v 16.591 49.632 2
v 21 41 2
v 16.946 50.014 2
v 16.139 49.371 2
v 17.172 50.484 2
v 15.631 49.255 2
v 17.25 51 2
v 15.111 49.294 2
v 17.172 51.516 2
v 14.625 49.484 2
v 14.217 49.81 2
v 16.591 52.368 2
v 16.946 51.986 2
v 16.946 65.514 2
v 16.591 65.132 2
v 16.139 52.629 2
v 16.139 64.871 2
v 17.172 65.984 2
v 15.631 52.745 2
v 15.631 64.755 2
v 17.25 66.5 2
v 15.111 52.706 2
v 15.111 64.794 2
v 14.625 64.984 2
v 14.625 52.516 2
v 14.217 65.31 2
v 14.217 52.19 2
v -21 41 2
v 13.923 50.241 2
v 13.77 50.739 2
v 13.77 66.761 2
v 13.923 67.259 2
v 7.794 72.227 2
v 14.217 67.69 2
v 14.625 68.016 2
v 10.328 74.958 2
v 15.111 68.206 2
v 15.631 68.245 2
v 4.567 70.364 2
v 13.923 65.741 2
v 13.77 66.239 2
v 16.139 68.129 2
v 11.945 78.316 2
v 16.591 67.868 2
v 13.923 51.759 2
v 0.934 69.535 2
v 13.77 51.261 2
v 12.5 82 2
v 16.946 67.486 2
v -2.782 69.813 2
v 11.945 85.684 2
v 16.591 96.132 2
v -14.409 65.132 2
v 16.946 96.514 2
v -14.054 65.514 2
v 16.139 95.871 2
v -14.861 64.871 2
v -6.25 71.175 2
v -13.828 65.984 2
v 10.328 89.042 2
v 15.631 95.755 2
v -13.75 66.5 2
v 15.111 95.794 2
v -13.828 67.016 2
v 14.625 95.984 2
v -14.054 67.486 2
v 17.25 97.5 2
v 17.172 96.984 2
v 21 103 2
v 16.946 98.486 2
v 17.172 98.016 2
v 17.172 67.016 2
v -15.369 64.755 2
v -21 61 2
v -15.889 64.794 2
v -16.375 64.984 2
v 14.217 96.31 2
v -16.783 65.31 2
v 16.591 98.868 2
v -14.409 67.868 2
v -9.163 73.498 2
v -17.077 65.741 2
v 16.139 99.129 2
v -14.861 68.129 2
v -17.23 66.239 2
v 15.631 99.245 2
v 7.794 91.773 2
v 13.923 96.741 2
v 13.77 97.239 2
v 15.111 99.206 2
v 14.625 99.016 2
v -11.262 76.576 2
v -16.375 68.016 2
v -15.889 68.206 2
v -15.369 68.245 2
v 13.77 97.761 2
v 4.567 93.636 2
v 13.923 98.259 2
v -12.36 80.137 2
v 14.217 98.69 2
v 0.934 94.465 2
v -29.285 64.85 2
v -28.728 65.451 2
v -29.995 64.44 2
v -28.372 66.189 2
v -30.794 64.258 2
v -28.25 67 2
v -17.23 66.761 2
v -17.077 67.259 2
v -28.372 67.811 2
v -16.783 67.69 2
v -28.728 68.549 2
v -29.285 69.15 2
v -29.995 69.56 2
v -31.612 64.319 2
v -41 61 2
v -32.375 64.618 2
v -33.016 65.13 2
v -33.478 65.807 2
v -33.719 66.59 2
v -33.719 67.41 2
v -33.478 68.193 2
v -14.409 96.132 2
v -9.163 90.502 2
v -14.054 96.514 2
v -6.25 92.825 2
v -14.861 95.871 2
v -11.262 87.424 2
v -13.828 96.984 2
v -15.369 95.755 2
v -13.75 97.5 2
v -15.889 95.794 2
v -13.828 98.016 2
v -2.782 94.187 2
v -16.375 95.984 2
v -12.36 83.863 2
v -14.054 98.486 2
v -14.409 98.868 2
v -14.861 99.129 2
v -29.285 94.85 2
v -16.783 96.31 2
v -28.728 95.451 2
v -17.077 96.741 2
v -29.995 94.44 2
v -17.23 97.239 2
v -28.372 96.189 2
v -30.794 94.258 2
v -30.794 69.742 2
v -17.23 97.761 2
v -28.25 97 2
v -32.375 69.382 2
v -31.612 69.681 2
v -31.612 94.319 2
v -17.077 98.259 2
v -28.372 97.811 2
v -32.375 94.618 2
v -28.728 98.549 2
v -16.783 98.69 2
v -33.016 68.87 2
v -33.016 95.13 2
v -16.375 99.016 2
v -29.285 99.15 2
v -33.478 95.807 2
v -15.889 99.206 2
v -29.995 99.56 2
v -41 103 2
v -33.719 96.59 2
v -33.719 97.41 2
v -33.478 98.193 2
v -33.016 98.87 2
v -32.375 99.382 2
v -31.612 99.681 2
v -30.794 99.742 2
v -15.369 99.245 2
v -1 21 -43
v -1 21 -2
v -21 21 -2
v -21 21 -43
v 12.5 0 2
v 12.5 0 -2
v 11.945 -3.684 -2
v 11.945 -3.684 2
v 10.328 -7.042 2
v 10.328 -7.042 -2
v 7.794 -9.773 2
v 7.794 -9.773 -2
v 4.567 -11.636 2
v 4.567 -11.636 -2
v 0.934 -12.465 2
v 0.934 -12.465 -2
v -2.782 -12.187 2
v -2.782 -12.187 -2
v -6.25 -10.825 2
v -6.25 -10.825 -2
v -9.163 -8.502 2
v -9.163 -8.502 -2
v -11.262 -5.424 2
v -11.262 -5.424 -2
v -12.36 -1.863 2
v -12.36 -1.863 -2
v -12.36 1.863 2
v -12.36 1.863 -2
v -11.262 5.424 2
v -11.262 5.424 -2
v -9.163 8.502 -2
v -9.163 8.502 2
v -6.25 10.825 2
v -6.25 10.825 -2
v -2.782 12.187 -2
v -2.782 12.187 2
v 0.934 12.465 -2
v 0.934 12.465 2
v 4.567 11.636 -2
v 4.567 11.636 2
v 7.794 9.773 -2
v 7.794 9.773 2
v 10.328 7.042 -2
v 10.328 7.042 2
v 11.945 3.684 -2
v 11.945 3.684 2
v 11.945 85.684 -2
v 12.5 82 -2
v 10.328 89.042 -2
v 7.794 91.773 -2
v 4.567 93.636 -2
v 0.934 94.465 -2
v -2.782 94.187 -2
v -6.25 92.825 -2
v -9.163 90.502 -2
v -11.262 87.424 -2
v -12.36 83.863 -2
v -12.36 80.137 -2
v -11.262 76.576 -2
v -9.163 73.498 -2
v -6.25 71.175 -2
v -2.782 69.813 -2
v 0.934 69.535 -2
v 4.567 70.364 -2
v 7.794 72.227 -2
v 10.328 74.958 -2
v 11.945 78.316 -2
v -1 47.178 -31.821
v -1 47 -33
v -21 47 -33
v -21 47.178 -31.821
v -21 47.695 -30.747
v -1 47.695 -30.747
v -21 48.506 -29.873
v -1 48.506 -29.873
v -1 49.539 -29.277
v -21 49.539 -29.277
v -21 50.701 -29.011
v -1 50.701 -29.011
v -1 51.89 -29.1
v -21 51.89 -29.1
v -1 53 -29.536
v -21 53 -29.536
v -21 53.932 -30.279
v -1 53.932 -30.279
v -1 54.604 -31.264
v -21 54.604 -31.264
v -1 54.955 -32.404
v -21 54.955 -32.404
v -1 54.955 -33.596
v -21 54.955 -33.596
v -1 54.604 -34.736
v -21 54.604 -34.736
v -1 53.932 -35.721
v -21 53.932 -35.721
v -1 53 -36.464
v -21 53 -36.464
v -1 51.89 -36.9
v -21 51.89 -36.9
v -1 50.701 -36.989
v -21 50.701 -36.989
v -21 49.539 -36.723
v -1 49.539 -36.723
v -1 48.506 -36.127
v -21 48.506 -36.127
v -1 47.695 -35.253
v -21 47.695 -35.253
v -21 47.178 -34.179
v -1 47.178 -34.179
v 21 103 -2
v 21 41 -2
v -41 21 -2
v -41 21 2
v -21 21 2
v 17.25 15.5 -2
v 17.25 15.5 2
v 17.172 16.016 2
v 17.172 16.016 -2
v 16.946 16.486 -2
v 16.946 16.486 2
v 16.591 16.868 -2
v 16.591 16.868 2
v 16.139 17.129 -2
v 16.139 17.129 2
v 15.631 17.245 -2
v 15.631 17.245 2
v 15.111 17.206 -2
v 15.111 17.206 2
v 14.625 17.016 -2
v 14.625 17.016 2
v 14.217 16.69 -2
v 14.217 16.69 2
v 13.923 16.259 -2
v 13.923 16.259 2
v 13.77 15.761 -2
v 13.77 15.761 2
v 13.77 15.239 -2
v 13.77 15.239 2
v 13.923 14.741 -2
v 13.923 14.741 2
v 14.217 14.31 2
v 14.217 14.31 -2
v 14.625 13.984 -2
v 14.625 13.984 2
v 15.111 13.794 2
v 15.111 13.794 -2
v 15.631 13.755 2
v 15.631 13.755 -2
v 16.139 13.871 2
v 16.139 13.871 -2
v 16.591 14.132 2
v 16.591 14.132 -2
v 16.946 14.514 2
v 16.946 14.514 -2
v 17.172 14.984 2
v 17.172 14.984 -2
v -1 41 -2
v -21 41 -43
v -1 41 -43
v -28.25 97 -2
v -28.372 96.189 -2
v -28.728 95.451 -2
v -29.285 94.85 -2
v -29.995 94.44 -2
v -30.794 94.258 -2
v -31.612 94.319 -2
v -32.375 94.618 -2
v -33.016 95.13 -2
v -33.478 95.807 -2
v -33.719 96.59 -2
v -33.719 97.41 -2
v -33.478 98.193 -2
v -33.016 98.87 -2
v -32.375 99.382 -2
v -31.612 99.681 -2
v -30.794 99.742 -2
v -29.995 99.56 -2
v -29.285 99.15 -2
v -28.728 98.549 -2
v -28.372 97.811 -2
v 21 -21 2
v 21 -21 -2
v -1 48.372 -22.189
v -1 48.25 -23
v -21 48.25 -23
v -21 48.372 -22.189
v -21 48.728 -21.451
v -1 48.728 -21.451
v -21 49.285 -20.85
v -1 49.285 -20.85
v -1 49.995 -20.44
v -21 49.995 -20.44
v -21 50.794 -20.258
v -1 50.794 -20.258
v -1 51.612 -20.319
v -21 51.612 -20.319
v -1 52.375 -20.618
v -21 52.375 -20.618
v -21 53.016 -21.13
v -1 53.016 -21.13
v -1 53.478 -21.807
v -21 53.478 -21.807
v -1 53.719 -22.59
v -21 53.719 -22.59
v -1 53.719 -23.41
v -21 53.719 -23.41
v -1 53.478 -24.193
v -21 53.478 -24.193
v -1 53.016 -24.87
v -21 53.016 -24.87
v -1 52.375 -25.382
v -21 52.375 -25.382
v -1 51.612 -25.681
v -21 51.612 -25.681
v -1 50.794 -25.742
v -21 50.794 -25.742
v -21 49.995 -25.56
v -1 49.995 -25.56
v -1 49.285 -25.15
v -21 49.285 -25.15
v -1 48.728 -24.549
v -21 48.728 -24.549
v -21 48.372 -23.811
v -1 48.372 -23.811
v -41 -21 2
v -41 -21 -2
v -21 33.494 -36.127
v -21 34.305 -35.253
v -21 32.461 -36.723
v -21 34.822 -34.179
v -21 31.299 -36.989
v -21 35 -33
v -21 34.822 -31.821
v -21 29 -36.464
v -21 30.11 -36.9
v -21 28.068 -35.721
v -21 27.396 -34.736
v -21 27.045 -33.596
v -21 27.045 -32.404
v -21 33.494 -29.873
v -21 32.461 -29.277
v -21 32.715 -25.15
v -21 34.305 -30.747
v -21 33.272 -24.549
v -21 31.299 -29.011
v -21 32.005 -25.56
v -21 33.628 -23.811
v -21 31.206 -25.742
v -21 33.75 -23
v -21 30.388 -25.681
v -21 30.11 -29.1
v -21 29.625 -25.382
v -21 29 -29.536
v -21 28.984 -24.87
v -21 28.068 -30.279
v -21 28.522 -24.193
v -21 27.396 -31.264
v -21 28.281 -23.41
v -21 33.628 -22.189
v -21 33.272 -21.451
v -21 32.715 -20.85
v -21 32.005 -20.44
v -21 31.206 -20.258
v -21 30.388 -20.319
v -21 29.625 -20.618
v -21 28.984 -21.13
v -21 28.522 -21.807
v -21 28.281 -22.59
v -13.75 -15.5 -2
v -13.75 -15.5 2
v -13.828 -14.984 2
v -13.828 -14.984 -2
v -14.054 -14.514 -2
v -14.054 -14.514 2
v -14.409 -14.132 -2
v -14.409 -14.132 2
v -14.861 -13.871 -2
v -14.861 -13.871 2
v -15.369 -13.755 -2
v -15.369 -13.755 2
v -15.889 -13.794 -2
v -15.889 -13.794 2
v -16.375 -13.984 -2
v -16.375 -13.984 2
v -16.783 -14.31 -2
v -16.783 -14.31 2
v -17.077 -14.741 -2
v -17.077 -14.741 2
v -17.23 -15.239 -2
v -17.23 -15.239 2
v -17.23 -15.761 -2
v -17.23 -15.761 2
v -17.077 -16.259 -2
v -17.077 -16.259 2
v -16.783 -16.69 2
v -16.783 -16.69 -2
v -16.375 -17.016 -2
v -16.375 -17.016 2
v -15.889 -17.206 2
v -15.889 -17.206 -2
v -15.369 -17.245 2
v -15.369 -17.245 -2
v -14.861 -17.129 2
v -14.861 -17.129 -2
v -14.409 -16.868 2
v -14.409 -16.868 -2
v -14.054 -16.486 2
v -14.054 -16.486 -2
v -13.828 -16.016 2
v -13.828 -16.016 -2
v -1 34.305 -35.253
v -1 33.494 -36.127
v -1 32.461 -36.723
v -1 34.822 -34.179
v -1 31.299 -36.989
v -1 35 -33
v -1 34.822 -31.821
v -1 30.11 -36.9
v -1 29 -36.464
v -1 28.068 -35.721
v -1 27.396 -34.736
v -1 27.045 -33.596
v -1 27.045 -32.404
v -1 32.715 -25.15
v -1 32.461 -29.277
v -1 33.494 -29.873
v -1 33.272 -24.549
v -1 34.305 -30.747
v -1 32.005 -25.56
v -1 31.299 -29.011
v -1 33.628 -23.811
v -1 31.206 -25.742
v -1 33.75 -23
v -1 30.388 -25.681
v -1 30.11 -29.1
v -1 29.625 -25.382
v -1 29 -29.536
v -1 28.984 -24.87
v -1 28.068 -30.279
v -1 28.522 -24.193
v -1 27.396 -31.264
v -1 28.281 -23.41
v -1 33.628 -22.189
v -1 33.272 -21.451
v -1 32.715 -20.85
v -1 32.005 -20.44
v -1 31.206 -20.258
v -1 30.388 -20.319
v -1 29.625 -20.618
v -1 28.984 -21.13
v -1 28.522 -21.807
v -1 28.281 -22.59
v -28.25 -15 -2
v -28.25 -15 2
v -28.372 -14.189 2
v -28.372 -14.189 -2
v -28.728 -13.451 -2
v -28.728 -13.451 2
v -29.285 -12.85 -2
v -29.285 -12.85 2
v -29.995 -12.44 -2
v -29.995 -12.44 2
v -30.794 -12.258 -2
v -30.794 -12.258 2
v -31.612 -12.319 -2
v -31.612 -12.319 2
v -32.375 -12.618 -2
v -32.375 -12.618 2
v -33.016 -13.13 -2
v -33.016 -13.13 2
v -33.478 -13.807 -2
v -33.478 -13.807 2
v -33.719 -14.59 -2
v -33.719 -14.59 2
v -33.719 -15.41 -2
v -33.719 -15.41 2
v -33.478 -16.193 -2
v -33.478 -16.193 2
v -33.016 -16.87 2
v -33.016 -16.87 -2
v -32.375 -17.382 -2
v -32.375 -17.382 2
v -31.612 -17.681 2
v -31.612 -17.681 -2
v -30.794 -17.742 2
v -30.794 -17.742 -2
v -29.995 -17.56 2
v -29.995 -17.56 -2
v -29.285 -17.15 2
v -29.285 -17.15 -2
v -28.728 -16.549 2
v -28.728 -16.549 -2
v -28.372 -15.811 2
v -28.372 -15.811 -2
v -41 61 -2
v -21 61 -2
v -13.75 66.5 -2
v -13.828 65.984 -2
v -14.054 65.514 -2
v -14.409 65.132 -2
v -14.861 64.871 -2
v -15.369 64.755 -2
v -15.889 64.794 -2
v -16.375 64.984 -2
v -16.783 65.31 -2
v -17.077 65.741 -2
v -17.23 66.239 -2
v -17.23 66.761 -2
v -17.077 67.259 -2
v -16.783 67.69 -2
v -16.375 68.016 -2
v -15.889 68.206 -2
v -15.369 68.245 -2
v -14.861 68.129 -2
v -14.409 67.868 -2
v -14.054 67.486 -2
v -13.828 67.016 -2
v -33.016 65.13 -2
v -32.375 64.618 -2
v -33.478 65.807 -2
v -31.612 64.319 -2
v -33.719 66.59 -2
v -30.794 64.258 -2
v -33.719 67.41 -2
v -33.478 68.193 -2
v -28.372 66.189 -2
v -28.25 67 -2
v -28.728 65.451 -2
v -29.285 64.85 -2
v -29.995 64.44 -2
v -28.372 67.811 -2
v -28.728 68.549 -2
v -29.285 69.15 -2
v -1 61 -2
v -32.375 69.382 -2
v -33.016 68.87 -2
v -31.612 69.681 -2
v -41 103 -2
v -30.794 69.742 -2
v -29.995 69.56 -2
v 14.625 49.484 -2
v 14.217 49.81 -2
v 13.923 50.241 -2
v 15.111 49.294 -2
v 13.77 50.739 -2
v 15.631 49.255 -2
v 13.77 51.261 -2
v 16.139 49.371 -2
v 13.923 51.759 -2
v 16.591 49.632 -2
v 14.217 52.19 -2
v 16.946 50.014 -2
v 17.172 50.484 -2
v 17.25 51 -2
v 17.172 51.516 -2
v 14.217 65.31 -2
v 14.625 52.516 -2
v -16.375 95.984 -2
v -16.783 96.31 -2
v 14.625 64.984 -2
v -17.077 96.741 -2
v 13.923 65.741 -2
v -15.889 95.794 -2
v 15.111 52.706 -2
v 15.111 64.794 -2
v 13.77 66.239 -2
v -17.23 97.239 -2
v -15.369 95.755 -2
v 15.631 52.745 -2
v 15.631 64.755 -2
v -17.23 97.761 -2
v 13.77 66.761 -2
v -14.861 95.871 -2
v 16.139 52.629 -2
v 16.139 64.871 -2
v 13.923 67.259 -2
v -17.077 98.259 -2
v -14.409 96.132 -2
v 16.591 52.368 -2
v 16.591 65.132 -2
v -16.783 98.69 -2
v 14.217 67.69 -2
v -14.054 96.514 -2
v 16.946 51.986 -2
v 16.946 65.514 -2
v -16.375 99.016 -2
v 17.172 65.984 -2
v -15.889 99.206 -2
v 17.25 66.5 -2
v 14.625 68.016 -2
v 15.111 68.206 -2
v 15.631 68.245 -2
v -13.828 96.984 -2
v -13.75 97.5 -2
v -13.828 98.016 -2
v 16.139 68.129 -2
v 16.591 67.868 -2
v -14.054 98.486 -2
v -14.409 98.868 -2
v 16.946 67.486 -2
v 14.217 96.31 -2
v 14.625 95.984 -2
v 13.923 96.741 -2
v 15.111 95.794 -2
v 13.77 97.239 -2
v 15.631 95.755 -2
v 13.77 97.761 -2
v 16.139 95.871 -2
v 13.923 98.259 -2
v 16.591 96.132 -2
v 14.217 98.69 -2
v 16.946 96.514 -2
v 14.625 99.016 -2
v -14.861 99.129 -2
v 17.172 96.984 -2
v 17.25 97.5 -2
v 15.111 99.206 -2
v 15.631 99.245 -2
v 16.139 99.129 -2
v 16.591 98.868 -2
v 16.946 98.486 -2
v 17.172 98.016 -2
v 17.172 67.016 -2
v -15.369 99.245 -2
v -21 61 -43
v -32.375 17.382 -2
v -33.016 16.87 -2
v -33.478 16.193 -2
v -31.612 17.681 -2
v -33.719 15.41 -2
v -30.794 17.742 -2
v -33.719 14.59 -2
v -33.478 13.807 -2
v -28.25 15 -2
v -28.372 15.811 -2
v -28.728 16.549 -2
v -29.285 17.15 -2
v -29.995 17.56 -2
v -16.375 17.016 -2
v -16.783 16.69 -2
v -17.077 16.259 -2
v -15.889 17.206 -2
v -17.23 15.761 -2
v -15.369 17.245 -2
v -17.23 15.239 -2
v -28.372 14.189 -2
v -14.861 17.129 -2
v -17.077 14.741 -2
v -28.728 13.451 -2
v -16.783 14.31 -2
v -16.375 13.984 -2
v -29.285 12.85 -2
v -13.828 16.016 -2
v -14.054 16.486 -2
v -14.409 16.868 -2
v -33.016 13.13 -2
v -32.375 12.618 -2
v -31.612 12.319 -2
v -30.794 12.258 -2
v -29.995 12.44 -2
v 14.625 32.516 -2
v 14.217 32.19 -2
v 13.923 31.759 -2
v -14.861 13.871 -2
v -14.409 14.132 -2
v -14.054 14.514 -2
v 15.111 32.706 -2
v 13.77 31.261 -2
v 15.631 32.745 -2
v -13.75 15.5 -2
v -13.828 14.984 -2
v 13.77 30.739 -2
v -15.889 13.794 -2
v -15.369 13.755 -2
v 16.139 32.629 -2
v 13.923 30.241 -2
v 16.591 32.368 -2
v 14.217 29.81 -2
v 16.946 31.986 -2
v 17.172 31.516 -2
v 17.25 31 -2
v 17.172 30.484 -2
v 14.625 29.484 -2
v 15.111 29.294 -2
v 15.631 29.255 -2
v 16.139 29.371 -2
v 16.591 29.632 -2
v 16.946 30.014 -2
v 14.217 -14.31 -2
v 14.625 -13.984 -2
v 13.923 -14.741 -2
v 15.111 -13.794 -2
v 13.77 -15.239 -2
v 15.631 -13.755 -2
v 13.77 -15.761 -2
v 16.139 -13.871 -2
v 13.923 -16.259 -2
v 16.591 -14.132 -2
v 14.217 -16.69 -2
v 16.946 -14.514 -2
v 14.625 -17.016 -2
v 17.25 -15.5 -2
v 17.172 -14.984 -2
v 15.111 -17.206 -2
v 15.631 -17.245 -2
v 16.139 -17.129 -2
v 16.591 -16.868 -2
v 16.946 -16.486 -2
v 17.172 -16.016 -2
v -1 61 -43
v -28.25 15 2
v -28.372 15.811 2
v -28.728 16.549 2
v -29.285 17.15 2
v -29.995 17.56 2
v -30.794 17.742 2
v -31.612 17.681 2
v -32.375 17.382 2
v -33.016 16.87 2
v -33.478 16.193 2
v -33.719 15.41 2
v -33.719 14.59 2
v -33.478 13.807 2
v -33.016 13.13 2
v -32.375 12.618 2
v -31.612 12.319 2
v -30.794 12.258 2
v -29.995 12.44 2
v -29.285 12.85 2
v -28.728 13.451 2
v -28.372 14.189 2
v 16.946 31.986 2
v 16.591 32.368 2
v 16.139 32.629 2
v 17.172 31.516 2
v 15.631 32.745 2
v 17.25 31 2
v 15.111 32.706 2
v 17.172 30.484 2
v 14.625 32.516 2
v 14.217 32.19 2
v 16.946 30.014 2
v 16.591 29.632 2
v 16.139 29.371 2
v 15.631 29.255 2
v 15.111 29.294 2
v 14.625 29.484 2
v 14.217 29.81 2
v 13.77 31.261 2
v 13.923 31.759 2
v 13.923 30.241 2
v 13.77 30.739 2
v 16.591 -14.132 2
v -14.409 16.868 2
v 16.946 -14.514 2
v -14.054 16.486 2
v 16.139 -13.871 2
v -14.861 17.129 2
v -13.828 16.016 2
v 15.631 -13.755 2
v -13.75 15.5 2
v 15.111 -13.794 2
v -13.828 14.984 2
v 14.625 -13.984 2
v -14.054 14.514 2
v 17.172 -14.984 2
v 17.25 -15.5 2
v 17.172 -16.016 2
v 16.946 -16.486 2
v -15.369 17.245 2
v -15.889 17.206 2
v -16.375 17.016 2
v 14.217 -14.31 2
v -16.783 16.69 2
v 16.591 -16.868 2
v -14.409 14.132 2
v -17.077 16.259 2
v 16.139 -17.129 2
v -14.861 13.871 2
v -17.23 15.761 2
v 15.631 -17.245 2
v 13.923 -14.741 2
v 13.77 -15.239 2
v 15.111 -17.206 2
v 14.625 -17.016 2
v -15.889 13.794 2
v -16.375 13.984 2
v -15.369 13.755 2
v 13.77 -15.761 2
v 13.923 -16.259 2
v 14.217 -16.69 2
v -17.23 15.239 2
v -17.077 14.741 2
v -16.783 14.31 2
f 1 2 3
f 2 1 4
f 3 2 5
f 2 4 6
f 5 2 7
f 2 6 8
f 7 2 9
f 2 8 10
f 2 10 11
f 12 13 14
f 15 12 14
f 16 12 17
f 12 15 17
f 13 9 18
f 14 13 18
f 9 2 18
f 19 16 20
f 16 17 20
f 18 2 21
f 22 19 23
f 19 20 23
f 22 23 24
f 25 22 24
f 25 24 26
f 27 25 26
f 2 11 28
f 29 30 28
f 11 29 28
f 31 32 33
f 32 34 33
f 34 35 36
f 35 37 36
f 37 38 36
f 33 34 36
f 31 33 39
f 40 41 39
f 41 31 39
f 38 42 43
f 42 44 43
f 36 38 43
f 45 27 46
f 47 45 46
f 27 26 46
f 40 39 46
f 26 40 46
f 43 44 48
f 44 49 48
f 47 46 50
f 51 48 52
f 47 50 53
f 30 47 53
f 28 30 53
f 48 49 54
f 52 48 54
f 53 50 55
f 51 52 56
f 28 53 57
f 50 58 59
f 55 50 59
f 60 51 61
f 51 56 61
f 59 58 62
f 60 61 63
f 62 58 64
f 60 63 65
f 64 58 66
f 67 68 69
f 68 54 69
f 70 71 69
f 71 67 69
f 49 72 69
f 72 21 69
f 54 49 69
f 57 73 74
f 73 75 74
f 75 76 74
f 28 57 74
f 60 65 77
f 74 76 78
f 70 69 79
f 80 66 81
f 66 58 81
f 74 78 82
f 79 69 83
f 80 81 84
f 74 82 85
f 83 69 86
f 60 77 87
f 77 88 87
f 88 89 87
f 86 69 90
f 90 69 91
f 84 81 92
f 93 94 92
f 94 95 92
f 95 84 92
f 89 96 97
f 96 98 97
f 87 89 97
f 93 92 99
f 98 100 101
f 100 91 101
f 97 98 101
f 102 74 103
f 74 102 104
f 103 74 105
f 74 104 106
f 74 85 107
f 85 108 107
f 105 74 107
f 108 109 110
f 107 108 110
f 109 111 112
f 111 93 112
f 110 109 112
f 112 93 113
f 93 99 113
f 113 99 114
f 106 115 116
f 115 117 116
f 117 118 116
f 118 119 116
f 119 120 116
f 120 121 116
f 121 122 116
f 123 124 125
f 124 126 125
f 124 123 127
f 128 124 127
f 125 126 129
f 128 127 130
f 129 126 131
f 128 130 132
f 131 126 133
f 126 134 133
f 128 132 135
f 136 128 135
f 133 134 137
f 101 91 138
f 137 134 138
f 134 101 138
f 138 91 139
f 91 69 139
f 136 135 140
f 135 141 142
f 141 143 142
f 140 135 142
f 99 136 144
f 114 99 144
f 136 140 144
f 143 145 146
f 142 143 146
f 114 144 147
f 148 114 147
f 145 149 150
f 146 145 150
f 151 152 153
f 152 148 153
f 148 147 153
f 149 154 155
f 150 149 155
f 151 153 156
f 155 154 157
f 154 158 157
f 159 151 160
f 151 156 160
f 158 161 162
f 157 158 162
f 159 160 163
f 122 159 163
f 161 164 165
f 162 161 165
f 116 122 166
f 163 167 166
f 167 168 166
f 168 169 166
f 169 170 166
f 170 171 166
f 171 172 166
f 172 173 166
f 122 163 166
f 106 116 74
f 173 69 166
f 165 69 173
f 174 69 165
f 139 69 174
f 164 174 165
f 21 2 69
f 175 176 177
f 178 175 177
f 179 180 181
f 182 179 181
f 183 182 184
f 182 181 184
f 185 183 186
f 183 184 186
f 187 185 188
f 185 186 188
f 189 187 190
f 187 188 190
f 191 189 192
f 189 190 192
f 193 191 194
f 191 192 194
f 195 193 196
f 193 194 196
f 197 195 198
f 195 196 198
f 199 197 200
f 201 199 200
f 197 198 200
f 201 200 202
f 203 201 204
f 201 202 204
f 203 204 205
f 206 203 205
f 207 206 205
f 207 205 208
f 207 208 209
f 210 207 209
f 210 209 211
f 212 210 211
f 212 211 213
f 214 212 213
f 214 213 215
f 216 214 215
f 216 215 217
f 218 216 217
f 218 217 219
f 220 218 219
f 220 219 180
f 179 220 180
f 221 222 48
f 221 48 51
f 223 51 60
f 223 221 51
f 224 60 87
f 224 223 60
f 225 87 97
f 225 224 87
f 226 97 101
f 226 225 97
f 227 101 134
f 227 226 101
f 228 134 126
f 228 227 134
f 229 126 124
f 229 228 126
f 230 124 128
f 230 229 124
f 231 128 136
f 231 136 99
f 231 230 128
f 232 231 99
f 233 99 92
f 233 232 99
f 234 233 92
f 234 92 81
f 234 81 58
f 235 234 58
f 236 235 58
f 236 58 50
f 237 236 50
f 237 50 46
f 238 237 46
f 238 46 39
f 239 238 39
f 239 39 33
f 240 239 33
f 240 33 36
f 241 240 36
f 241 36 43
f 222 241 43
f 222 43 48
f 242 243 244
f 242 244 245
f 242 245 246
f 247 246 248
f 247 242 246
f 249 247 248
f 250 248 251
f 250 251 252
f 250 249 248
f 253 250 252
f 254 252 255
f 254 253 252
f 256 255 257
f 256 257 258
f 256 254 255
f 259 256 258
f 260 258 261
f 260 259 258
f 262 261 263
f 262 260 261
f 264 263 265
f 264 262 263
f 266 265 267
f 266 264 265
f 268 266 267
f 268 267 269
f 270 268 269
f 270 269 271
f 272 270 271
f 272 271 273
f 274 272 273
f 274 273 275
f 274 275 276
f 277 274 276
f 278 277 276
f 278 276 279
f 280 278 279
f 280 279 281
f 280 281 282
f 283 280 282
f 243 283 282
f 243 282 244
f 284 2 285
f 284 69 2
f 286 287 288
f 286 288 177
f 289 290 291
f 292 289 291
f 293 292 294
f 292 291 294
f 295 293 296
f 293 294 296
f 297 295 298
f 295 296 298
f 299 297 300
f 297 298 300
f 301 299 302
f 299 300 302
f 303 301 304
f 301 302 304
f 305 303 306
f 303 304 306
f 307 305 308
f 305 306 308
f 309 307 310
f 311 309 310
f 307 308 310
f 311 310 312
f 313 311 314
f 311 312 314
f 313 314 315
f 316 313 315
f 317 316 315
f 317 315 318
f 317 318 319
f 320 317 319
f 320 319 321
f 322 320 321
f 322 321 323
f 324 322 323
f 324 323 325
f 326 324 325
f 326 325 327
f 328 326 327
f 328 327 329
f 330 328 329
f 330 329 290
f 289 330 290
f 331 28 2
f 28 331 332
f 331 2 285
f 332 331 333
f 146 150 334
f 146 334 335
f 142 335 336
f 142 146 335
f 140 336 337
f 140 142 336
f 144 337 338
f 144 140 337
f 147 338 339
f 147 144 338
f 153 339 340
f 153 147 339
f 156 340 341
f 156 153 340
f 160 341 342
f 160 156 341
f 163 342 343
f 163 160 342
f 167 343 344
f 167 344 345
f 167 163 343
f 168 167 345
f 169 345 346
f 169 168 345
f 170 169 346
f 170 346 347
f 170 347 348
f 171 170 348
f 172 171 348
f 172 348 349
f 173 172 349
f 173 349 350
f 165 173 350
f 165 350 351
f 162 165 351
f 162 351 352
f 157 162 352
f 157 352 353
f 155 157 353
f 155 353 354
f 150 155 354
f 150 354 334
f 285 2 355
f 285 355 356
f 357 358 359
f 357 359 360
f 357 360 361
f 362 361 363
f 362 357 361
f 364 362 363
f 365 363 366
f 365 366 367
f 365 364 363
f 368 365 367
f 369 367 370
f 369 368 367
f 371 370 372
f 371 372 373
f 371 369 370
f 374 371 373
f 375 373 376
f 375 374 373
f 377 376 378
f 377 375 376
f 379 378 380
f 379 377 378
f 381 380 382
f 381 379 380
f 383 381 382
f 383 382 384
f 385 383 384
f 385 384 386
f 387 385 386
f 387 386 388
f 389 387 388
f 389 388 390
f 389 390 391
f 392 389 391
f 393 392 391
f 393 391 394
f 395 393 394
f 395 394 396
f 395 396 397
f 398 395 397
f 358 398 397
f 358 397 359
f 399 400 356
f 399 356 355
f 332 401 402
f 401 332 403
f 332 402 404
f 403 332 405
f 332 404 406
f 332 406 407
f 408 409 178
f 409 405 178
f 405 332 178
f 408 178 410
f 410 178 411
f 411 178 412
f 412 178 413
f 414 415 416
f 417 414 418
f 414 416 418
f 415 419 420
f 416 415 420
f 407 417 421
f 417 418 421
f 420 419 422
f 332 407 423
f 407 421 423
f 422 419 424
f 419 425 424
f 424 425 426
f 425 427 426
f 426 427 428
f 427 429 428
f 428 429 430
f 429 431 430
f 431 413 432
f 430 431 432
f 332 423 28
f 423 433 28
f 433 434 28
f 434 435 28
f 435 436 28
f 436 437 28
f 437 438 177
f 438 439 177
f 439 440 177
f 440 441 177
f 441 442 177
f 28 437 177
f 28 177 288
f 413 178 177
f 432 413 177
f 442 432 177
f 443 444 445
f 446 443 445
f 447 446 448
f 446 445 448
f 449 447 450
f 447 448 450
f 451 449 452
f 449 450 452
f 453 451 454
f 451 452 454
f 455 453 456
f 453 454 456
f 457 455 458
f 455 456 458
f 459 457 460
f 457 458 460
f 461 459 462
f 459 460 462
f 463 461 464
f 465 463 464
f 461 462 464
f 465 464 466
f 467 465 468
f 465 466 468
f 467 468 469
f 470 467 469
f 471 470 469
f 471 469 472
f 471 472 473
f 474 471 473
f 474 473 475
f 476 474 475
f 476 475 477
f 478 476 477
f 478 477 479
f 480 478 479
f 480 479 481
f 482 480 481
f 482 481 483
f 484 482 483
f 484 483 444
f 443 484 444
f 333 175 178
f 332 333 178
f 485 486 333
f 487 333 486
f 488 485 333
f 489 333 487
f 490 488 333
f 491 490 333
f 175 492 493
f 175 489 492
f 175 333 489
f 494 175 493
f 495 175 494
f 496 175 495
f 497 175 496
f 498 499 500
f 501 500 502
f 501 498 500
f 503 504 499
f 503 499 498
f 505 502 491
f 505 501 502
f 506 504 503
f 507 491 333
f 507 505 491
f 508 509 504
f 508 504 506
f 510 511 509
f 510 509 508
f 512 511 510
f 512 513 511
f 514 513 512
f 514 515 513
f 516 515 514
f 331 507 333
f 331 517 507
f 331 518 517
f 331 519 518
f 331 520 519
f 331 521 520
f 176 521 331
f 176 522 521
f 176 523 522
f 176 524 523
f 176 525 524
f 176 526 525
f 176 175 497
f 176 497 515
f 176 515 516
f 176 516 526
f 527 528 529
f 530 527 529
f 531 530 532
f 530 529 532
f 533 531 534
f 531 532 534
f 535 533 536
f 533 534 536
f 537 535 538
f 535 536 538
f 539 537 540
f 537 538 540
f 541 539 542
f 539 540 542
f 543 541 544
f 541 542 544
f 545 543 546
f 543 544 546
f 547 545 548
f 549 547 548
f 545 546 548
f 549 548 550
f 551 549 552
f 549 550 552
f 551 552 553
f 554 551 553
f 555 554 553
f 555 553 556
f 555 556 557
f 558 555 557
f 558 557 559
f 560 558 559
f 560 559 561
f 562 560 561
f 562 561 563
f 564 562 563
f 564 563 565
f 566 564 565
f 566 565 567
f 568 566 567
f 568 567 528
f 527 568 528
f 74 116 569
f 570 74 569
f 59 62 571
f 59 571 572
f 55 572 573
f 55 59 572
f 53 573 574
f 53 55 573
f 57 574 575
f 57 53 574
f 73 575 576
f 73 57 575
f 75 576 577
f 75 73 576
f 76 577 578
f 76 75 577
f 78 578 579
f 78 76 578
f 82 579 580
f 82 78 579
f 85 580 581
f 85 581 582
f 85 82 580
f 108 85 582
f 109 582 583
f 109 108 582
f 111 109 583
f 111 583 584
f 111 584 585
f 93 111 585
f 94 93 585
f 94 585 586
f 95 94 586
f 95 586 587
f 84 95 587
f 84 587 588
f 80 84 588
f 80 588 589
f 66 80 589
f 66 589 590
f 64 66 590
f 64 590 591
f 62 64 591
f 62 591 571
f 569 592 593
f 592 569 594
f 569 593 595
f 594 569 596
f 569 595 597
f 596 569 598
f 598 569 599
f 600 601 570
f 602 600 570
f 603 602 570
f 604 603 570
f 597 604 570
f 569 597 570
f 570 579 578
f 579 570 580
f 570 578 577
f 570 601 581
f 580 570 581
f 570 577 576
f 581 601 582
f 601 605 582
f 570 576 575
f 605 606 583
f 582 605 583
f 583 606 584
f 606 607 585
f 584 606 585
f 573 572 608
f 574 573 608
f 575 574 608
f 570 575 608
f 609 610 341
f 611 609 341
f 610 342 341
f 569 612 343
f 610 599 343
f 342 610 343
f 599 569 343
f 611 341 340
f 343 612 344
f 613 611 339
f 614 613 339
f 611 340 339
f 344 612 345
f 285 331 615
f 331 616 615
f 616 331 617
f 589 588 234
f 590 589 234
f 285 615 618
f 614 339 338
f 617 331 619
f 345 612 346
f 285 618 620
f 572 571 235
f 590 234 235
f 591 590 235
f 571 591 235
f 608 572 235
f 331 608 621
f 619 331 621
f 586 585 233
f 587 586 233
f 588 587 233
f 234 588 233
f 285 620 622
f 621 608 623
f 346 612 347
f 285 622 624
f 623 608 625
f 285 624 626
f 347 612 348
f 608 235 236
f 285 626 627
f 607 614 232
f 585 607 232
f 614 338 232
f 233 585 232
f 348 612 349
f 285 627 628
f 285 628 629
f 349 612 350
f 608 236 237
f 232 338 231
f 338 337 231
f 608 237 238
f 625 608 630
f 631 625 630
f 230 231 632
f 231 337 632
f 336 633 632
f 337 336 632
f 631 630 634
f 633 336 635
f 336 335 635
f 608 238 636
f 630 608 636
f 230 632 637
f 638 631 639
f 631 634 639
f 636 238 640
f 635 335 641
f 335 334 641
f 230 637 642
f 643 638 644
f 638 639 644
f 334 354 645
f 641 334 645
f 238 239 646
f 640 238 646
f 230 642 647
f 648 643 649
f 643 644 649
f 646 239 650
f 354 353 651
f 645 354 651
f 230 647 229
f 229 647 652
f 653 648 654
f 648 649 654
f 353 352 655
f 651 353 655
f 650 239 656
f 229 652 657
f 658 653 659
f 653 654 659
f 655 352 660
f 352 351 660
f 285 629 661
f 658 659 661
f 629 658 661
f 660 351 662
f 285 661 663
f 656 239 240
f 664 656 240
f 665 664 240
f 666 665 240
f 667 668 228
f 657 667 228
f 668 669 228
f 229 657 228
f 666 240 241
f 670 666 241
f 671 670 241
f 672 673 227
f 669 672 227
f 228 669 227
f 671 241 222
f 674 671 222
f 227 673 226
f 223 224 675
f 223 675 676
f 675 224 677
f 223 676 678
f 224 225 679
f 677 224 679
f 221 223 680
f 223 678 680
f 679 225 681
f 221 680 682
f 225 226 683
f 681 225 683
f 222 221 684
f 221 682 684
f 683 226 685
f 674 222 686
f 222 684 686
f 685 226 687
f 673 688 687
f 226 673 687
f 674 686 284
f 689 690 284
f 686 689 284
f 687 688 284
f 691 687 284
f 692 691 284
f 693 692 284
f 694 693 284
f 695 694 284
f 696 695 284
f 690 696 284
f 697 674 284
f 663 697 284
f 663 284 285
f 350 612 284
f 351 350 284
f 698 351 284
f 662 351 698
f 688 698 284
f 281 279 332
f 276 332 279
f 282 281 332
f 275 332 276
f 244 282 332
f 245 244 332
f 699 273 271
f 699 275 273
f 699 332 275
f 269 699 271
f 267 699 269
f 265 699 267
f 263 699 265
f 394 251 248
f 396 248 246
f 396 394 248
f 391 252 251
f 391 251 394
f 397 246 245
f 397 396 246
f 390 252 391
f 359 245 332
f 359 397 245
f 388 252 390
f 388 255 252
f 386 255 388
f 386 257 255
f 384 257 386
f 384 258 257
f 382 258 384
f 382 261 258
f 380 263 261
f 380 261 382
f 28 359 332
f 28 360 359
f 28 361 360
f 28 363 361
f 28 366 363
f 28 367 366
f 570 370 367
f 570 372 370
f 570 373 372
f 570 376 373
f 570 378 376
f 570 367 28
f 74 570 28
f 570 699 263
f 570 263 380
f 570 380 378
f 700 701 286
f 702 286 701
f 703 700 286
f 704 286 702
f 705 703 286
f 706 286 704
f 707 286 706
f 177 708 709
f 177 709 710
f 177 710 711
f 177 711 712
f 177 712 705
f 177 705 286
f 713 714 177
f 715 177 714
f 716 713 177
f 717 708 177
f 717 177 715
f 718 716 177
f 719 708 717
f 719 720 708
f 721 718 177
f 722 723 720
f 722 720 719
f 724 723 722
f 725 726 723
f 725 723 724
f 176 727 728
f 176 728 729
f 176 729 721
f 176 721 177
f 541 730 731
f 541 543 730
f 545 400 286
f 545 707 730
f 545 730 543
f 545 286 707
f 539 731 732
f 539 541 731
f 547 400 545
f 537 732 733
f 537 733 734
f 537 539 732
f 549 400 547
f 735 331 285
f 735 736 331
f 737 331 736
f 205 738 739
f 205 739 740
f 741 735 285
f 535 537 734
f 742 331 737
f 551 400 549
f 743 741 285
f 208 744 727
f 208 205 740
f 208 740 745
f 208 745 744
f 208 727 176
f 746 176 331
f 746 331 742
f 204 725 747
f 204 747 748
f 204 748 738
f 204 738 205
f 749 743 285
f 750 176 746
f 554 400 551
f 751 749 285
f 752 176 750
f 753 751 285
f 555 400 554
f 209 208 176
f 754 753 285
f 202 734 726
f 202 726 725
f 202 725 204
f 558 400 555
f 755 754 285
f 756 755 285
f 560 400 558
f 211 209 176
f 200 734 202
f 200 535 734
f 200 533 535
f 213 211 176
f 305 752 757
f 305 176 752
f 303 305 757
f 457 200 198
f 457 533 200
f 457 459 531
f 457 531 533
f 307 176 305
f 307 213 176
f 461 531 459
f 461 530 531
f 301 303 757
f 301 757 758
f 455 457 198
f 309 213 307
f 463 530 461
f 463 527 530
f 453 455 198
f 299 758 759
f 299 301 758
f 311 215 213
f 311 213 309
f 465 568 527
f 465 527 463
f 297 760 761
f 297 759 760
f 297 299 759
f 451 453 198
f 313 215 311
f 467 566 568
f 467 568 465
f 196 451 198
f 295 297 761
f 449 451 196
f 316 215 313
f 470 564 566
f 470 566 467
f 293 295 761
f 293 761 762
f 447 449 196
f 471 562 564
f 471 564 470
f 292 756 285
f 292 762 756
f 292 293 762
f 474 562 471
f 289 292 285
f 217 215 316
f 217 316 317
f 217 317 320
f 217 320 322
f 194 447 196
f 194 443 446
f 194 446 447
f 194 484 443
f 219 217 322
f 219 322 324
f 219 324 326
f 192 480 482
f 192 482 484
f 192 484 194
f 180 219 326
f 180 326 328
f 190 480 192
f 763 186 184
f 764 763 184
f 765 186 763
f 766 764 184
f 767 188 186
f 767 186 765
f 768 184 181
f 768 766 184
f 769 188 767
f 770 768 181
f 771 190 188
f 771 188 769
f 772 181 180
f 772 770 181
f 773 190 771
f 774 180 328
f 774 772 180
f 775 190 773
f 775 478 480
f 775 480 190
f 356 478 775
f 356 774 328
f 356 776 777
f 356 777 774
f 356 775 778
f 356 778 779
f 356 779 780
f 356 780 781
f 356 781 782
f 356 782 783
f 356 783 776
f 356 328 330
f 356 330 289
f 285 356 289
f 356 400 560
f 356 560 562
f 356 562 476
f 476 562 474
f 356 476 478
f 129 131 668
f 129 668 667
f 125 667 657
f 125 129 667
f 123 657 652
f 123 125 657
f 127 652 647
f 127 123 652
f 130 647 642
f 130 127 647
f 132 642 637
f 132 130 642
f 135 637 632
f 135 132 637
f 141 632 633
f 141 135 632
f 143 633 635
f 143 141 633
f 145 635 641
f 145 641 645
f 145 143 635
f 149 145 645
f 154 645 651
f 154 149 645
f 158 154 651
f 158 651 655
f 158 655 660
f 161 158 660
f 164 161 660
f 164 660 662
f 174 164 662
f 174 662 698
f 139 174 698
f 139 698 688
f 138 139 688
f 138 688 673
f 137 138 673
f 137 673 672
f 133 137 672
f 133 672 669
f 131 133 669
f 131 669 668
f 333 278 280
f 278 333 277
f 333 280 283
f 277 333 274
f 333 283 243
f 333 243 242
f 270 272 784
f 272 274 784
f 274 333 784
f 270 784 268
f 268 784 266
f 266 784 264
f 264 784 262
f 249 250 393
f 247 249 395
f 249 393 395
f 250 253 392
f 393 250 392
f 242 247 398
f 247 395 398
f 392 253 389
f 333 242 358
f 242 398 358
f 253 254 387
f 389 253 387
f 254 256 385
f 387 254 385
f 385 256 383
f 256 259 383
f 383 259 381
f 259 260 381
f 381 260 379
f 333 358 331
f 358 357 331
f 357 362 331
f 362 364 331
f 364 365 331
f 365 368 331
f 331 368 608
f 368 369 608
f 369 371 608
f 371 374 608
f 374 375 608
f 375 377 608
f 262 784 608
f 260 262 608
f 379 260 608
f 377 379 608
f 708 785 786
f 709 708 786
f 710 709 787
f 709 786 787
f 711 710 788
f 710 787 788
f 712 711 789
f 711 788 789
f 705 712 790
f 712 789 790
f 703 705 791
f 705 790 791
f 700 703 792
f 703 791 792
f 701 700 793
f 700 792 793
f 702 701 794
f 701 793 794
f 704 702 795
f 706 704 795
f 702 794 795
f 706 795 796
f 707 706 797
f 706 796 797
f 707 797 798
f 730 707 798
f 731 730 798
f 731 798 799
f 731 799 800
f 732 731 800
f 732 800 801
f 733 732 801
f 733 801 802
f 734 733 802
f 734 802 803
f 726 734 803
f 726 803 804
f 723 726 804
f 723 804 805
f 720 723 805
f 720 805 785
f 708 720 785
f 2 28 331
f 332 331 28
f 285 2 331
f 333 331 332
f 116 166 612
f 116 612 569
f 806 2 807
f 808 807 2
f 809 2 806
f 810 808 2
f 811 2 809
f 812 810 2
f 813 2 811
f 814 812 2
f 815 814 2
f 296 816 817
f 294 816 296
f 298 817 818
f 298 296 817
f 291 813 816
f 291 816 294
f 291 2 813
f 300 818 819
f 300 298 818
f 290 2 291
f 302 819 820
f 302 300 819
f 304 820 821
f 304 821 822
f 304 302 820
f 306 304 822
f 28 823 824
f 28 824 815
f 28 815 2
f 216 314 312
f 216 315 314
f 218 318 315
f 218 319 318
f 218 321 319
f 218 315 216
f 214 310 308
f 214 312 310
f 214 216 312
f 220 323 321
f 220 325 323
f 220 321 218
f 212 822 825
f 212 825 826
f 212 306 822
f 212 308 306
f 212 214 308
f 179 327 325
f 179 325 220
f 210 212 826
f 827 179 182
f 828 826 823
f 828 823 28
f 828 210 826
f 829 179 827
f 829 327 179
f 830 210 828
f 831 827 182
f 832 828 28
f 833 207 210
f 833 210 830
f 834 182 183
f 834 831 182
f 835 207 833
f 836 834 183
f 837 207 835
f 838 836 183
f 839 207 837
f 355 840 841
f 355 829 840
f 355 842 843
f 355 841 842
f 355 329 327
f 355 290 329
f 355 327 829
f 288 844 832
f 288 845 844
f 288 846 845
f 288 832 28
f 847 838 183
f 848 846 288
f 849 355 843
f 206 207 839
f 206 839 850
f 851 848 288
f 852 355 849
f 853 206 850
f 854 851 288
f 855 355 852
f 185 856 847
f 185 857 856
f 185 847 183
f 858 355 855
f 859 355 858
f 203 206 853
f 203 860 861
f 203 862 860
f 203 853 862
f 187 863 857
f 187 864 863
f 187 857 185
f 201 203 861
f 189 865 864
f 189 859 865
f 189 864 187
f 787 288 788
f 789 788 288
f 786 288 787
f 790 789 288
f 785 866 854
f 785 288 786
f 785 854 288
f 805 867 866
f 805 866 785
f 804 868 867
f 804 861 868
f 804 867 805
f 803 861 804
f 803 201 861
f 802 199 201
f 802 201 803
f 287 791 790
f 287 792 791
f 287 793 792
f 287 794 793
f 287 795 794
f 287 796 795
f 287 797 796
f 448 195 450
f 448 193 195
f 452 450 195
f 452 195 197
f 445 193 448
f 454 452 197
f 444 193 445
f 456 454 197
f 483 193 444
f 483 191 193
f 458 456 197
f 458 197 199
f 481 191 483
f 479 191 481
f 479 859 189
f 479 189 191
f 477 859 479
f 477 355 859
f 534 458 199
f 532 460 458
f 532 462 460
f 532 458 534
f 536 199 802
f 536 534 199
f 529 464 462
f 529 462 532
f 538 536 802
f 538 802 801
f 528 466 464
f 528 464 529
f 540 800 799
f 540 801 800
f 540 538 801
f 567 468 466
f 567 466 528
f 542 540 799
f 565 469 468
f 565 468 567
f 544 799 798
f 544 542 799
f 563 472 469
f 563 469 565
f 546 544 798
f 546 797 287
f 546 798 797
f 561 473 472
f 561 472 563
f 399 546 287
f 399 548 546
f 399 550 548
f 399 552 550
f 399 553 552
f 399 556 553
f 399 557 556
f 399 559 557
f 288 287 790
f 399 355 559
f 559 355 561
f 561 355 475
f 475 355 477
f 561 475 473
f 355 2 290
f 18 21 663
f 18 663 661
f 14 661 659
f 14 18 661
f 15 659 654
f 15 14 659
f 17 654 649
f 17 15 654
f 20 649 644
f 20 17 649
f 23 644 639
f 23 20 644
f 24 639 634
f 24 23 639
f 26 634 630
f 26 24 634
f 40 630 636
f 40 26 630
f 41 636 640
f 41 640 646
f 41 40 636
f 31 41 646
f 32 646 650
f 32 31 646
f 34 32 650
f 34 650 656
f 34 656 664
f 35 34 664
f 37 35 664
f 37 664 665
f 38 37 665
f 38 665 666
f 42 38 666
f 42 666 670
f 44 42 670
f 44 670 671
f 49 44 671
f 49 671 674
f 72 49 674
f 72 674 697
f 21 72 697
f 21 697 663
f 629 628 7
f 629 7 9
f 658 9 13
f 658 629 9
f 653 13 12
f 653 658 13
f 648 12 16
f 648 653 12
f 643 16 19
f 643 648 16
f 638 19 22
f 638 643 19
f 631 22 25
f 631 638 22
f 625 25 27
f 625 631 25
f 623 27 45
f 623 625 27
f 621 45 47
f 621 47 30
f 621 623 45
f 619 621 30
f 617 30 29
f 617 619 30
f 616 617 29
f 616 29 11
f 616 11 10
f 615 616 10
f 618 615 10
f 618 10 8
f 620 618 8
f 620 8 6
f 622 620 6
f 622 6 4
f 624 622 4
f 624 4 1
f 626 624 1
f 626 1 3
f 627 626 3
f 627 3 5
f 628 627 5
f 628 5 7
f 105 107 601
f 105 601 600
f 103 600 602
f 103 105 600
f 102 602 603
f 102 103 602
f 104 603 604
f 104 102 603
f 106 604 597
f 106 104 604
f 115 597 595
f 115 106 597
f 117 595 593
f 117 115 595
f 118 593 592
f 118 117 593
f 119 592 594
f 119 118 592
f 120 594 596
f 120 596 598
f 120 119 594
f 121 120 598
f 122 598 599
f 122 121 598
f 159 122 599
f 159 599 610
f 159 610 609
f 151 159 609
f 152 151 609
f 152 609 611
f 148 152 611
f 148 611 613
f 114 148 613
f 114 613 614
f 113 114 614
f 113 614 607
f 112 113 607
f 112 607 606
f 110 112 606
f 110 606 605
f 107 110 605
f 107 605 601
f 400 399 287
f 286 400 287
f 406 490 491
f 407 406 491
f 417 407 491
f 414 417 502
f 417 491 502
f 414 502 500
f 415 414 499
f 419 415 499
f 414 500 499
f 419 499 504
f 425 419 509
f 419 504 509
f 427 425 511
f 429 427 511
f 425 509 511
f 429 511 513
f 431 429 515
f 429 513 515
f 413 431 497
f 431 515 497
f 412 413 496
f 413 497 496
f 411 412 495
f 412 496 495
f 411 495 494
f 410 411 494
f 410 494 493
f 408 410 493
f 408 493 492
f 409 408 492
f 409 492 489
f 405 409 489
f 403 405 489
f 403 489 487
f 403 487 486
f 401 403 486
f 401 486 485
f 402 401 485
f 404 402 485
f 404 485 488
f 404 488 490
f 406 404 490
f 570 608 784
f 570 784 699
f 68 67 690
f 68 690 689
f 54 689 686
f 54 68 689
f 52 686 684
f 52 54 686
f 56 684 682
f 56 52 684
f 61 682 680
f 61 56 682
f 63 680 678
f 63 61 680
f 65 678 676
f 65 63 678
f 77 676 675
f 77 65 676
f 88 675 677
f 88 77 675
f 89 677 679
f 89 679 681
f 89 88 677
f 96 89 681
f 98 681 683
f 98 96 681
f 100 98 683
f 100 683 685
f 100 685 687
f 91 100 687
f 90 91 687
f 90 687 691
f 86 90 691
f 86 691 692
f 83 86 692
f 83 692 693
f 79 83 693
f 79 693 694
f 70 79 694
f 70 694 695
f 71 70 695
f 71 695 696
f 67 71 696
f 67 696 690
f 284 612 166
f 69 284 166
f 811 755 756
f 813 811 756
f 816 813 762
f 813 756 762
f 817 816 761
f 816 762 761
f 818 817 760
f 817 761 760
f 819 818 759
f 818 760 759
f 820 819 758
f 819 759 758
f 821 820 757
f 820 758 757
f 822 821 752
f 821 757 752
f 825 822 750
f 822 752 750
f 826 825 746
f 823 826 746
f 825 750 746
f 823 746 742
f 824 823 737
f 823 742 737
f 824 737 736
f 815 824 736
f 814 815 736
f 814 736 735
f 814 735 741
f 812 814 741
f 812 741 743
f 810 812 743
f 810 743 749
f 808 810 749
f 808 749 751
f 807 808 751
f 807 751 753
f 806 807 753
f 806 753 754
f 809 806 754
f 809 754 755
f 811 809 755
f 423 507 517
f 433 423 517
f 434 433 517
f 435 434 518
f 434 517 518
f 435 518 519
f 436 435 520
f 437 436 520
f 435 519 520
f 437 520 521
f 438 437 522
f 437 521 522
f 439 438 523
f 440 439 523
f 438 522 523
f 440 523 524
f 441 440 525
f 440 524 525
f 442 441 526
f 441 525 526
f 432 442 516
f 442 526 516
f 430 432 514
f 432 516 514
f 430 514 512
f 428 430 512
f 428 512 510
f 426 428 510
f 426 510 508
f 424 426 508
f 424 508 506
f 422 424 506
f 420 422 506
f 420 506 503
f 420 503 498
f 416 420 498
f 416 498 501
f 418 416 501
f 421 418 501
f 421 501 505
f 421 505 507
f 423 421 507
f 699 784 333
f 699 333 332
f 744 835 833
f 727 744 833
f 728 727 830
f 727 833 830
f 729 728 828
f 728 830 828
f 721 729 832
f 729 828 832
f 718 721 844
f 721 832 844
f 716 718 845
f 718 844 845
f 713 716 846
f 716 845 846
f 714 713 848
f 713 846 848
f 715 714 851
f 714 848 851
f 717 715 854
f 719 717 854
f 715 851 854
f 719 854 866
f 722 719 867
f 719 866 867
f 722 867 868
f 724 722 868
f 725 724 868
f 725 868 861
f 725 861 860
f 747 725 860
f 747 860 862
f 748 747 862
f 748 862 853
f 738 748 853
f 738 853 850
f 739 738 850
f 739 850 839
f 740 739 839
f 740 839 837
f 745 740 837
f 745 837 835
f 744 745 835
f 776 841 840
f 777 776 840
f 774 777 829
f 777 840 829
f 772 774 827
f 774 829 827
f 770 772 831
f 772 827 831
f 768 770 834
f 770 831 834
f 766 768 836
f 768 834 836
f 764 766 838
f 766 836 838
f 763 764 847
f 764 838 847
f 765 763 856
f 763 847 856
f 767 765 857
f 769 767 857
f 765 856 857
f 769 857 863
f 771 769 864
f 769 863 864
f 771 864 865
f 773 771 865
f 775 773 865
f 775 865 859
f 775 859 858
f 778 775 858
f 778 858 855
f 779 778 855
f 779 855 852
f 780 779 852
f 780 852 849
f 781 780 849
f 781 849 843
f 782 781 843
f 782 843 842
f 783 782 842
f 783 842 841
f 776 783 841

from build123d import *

# Parameters (mm, degrees)
F0_W      = 42
F0_H      = 42
F1_DEPTH  = 2
F2_R      = 1.75
F3_DEPTH  = 4.001
F4_DEPTH  = 20
F5_R      = 2.75
F6_DEPTH  = 4.001
F7_W      = 20
F7_H      = 45
F8_DEPTH  = 20
F9_DEPTH  = 20
F10_R     = 4
F10_R_2   = 2.75
F11_DEPTH = 40.001
F12_R     = 1.75
F13_DEPTH = 4.001
F14_R     = 12.5
F15_DEPTH = 4.001


with BuildPart() as f1:
    # F0 (on Top) → F1 (new body, symmetric)
    with BuildSketch(Plane.XY):
        Rectangle(F0_W, F0_H)
    extrude(amount=F1_DEPTH, both=True)

    # F2 (on face) → F3 (cut, through all)
    with BuildSketch(Plane.XY.offset(2)):
        with Locations((-15.5, 15.5)):
            Circle(F2_R)
        with Locations((15.5, 15.5)):
            Circle(F2_R)
        with Locations((-15.5, -15.5)):
            Circle(F2_R)
        with Locations((15.5, -15.5)):
            Circle(F2_R)
    extrude(amount=-F3_DEPTH, mode=Mode.SUBTRACT)

    # F4 (add): a face of the model
    f4_faces = [f1.faces().sort_by_distance(p)[0] for p in [
        (-21, 0, 0),
    ]]
    extrude(f4_faces, amount=F4_DEPTH)

    # F5 (on face) → F6 (cut, through all)
    with BuildSketch(Plane.XY.offset(2)):
        with Locations((-31, 15)):
            Circle(F5_R)
        with Locations((-31, -15)):
            Circle(F5_R)
    extrude(amount=-F6_DEPTH, mode=Mode.SUBTRACT)

    # F7 (on face) → F8 (join)
    with BuildSketch(Plane(origin=(0, 21, 0), x_dir=(-1, 0, 0), z_dir=(0, 1, 0))):
        with Locations((11, -20.5)):
            Rectangle(F7_W, F7_H)
    extrude(amount=F8_DEPTH)

    # F9 (add, through all): a face of the model
    f9_faces = [f1.faces().sort_by_distance(p)[0] for p in [
        (10, 21, 0),
    ]]
    extrude(f9_faces, amount=F9_DEPTH)

    # F10 (on face) → F11 (cut, through all)
    with BuildSketch(Plane.YZ.offset(-1)):
        with Locations((31, -33)):
            Circle(F10_R)
        with Locations((31, -23)):
            Circle(F10_R_2)
    extrude(amount=-F11_DEPTH, mode=Mode.SUBTRACT)

    # F12 (on face) → F13 (cut, through all)
    with BuildSketch(Plane(origin=(0, 0, -2), x_dir=(1, 0, 0), z_dir=(0, 0, -1))):
        with Locations((15.5, -31.0000000004)):
            Circle(F12_R)
    extrude(amount=-F13_DEPTH, mode=Mode.SUBTRACT)

    # F14 (on face) → F15 (cut, through all)
    with BuildSketch(Plane(origin=(0, 0, -2), x_dir=(1, 0, 0), z_dir=(0, 0, -1))):
        Circle(F14_R)
    extrude(amount=-F15_DEPTH, mode=Mode.SUBTRACT)


with BuildPart() as f16_1:
    # F16: instance of F1
    add(f1.part.mirror(Plane(origin=(-9.1295546559, 41, -18.6740890688), x_dir=(-1, 0, 0), z_dir=(0, 1, 0))))


solid = Compound([f1.part, f16_1.part])
